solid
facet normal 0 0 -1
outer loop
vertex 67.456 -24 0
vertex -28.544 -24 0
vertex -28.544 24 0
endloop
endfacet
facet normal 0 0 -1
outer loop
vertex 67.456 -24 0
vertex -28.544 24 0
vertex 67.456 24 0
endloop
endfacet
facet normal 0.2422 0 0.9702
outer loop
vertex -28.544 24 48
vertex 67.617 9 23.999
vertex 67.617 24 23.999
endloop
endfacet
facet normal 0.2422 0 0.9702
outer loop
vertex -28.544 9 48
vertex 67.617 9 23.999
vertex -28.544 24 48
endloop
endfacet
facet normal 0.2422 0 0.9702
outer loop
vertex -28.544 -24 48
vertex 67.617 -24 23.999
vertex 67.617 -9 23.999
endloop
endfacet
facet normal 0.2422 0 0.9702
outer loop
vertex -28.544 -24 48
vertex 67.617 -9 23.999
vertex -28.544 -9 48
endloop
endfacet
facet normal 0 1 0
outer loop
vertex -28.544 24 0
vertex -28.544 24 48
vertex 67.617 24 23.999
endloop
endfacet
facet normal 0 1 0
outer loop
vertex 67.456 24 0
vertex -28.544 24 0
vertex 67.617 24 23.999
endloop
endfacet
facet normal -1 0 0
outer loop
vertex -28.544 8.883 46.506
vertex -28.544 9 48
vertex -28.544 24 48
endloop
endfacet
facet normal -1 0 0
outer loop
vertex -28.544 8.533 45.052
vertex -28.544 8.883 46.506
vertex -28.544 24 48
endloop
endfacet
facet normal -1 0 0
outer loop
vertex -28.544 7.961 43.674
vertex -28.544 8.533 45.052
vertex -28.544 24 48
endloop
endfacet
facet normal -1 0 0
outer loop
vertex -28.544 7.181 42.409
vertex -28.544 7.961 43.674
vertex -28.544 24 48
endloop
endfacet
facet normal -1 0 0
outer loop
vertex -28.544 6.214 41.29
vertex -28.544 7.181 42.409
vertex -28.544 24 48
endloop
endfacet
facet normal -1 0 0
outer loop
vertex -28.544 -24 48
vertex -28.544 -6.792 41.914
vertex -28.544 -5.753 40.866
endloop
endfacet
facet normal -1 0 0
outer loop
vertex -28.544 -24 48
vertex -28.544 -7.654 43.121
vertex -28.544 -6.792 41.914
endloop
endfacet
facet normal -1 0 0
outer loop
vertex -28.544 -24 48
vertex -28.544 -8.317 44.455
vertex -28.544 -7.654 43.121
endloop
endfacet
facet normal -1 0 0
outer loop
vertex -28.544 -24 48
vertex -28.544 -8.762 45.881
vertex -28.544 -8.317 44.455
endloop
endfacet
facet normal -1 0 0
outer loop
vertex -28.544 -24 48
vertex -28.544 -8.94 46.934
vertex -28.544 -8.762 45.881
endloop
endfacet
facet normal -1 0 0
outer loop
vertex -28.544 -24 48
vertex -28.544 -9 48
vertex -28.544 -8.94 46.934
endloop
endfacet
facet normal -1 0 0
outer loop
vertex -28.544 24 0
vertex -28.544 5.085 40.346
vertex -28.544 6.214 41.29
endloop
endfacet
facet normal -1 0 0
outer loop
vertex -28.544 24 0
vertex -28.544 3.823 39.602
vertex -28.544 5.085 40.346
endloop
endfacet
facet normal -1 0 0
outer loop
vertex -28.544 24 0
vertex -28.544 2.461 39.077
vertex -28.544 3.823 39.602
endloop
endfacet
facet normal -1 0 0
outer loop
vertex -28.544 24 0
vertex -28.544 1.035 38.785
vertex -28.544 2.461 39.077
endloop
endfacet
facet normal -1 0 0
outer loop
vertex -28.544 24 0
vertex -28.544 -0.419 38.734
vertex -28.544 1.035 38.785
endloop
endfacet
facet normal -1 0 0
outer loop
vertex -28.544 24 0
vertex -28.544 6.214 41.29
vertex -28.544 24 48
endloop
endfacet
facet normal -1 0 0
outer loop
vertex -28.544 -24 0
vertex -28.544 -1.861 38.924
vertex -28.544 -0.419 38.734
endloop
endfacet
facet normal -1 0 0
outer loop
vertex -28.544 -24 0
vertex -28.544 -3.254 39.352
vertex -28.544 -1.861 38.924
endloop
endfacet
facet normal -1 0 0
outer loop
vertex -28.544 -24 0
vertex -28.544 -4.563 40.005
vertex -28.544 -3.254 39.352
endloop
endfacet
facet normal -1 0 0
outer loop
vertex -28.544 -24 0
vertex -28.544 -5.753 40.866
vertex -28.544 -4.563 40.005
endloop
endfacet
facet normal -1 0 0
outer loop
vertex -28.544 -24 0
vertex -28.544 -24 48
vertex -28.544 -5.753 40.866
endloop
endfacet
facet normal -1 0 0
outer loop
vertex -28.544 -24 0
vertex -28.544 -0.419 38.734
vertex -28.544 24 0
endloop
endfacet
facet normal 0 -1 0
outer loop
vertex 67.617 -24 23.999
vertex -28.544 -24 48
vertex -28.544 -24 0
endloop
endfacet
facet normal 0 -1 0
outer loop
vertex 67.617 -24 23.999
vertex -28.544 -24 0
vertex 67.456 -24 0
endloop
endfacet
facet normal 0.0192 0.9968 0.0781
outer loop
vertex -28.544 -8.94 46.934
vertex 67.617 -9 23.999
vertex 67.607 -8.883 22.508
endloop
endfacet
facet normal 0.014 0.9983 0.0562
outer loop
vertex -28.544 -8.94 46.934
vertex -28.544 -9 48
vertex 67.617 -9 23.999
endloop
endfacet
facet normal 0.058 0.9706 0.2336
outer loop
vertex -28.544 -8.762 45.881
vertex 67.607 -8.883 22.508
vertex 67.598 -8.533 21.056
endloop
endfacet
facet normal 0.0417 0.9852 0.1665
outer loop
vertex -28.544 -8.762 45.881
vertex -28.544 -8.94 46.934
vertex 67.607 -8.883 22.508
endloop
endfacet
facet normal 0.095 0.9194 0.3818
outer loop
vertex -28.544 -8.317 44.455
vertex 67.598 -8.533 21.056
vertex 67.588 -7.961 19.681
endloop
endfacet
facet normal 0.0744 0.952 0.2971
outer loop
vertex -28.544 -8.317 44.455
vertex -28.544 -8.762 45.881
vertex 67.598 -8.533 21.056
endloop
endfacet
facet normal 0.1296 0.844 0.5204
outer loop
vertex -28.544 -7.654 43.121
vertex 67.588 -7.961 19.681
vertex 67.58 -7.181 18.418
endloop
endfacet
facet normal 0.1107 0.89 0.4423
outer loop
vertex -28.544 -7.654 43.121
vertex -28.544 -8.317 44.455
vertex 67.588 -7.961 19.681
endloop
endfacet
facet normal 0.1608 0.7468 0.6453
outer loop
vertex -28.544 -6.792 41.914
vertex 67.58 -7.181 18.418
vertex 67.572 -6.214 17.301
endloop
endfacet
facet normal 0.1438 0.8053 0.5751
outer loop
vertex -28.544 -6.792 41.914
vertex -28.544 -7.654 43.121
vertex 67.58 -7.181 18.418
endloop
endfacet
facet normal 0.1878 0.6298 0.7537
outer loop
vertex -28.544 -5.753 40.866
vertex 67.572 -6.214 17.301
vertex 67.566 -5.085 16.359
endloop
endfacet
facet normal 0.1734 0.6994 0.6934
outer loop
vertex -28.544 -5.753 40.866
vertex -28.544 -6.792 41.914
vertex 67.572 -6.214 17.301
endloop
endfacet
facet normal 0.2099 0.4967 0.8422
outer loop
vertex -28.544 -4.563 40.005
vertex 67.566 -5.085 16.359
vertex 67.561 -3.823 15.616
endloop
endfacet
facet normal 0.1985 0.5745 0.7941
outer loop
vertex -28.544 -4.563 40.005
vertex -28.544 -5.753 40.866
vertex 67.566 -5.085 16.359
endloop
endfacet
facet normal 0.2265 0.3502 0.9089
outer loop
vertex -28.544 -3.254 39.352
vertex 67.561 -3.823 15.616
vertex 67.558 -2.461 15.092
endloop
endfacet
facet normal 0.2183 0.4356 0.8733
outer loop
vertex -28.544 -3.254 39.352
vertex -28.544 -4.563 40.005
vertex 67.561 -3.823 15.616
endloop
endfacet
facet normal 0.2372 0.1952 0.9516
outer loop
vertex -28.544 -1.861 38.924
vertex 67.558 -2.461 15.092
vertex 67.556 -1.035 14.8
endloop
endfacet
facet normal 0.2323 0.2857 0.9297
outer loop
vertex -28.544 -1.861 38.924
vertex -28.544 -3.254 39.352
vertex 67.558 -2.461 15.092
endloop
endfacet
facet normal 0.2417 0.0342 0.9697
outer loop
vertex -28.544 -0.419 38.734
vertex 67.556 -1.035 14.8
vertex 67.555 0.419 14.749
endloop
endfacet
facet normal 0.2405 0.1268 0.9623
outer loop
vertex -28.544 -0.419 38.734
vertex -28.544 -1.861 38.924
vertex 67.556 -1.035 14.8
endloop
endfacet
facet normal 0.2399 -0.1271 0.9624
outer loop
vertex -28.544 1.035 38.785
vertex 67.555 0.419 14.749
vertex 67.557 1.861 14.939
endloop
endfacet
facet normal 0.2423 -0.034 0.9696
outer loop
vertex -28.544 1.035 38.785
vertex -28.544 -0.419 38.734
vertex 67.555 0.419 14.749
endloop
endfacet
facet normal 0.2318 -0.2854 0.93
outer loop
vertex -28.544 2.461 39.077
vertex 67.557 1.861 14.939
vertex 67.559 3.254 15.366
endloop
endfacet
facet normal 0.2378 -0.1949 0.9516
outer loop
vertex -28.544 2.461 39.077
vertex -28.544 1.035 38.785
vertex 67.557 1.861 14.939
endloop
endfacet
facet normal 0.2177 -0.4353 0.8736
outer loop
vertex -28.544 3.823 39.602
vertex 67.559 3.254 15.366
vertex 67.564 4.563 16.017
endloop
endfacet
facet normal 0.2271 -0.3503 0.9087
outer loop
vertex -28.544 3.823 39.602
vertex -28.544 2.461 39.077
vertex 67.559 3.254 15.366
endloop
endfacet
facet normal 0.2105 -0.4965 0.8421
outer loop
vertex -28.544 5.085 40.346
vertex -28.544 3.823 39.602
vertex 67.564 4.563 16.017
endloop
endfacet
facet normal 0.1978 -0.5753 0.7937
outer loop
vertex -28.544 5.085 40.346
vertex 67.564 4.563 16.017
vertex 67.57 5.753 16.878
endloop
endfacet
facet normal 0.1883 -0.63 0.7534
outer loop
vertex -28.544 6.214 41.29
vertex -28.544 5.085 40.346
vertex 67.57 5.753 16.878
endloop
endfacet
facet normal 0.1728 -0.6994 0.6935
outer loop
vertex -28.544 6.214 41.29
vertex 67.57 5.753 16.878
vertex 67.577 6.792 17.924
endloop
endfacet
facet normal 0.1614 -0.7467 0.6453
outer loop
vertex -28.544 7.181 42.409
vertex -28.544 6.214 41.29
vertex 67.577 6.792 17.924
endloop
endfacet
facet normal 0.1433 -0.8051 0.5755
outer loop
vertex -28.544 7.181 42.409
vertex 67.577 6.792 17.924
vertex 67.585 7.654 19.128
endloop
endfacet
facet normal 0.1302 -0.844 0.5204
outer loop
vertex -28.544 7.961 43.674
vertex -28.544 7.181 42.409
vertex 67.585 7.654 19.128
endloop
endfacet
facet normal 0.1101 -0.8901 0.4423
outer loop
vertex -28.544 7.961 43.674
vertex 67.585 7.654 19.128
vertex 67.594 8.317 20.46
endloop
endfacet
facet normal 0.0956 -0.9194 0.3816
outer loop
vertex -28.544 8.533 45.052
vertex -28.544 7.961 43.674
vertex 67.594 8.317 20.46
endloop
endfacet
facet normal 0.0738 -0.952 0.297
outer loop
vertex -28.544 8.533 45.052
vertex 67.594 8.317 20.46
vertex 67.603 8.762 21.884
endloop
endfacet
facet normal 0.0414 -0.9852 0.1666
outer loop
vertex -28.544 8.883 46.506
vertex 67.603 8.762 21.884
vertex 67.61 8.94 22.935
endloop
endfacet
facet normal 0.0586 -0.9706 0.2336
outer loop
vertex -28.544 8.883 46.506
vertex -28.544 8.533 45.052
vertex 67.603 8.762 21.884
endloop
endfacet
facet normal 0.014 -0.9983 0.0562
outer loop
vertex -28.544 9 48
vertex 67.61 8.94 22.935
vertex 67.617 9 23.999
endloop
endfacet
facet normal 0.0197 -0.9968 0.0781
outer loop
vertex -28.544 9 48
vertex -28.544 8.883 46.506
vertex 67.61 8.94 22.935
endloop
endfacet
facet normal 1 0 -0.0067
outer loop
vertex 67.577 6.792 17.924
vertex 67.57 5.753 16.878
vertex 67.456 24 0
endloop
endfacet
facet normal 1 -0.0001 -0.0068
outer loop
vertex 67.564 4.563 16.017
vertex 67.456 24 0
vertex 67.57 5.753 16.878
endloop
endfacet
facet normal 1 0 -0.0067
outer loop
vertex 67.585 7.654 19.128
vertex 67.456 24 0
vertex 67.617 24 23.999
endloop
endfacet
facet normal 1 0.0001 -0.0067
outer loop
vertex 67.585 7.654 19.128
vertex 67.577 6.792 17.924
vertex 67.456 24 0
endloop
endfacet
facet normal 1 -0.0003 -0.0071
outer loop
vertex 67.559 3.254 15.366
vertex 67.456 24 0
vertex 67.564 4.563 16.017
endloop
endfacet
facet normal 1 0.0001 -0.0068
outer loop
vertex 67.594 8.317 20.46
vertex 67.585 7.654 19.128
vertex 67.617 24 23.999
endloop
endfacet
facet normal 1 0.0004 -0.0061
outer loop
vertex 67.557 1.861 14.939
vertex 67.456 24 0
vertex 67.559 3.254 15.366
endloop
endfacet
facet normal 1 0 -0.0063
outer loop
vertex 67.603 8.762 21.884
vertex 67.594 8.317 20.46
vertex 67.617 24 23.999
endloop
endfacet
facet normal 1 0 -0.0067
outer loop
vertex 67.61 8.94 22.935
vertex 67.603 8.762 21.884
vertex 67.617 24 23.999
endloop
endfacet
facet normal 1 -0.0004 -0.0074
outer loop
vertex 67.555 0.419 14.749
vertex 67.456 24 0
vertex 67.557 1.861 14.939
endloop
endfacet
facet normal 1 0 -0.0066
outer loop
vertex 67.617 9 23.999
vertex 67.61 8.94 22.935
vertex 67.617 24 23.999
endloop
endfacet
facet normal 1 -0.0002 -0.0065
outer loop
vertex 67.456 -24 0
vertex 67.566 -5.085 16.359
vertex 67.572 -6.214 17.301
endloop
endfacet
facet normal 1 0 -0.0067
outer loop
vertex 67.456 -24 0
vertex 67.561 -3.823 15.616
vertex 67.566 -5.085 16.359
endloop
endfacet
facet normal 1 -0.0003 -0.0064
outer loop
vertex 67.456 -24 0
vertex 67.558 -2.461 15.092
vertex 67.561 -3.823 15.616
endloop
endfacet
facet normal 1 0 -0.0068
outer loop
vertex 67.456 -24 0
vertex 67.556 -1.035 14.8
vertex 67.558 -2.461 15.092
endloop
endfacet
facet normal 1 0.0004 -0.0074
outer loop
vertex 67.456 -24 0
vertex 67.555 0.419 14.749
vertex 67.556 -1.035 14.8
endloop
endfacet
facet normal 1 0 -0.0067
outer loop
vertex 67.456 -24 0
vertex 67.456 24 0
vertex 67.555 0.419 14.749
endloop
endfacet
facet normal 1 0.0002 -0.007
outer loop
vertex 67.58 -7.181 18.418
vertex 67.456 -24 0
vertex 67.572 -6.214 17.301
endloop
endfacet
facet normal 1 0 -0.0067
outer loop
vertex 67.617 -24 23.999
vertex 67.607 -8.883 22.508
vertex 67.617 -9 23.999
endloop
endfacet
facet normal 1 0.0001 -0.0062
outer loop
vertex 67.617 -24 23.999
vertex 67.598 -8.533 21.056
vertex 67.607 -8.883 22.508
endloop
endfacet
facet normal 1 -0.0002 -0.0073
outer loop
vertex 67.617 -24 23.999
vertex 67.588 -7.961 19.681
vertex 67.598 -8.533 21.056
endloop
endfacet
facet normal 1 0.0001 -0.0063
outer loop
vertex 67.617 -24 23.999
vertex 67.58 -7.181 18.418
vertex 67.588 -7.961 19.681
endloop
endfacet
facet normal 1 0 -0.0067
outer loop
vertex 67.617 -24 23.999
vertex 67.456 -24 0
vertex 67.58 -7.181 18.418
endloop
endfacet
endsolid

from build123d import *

# Parameters (mm, degrees)
F1_DEPTH = 24
F2_W     = 99.111150098
F2_H     = 9
F2_W_2   = 5.3233464885


with BuildPart() as f1:
    # F0 (on Front) → F1 (new body, symmetric)
    with BuildSketch(Plane.XZ):
        Polygon((-28.5438378341, 48), (-28.5438378341, 0), (67.4561621659, 0), (67.6174540565, 23.9994580132), align=None)
    extrude(amount=F1_DEPTH, both=True)

    # F2 (on face) → F3 (revolve, cut)
    with BuildSketch(Plane(origin=(9.6037996504, 0, 38.4788719333), x_dir=(0.9702368684, 0, -0.2421578396), z_dir=(0.2421578396, 0, 0.9702368684))):
        with Locations((10.2377149176, 4.5)):
            Rectangle(F2_W, F2_H)
        with Locations((62.4549632108, 4.5)):
            Rectangle(F2_W_2, F2_H)
    revolve(axis=Axis((22.1192616243, 0, 35.3551839641), (0.9702368684, 0, -0.2421578396)), mode=Mode.SUBTRACT)


solid = f1.part
